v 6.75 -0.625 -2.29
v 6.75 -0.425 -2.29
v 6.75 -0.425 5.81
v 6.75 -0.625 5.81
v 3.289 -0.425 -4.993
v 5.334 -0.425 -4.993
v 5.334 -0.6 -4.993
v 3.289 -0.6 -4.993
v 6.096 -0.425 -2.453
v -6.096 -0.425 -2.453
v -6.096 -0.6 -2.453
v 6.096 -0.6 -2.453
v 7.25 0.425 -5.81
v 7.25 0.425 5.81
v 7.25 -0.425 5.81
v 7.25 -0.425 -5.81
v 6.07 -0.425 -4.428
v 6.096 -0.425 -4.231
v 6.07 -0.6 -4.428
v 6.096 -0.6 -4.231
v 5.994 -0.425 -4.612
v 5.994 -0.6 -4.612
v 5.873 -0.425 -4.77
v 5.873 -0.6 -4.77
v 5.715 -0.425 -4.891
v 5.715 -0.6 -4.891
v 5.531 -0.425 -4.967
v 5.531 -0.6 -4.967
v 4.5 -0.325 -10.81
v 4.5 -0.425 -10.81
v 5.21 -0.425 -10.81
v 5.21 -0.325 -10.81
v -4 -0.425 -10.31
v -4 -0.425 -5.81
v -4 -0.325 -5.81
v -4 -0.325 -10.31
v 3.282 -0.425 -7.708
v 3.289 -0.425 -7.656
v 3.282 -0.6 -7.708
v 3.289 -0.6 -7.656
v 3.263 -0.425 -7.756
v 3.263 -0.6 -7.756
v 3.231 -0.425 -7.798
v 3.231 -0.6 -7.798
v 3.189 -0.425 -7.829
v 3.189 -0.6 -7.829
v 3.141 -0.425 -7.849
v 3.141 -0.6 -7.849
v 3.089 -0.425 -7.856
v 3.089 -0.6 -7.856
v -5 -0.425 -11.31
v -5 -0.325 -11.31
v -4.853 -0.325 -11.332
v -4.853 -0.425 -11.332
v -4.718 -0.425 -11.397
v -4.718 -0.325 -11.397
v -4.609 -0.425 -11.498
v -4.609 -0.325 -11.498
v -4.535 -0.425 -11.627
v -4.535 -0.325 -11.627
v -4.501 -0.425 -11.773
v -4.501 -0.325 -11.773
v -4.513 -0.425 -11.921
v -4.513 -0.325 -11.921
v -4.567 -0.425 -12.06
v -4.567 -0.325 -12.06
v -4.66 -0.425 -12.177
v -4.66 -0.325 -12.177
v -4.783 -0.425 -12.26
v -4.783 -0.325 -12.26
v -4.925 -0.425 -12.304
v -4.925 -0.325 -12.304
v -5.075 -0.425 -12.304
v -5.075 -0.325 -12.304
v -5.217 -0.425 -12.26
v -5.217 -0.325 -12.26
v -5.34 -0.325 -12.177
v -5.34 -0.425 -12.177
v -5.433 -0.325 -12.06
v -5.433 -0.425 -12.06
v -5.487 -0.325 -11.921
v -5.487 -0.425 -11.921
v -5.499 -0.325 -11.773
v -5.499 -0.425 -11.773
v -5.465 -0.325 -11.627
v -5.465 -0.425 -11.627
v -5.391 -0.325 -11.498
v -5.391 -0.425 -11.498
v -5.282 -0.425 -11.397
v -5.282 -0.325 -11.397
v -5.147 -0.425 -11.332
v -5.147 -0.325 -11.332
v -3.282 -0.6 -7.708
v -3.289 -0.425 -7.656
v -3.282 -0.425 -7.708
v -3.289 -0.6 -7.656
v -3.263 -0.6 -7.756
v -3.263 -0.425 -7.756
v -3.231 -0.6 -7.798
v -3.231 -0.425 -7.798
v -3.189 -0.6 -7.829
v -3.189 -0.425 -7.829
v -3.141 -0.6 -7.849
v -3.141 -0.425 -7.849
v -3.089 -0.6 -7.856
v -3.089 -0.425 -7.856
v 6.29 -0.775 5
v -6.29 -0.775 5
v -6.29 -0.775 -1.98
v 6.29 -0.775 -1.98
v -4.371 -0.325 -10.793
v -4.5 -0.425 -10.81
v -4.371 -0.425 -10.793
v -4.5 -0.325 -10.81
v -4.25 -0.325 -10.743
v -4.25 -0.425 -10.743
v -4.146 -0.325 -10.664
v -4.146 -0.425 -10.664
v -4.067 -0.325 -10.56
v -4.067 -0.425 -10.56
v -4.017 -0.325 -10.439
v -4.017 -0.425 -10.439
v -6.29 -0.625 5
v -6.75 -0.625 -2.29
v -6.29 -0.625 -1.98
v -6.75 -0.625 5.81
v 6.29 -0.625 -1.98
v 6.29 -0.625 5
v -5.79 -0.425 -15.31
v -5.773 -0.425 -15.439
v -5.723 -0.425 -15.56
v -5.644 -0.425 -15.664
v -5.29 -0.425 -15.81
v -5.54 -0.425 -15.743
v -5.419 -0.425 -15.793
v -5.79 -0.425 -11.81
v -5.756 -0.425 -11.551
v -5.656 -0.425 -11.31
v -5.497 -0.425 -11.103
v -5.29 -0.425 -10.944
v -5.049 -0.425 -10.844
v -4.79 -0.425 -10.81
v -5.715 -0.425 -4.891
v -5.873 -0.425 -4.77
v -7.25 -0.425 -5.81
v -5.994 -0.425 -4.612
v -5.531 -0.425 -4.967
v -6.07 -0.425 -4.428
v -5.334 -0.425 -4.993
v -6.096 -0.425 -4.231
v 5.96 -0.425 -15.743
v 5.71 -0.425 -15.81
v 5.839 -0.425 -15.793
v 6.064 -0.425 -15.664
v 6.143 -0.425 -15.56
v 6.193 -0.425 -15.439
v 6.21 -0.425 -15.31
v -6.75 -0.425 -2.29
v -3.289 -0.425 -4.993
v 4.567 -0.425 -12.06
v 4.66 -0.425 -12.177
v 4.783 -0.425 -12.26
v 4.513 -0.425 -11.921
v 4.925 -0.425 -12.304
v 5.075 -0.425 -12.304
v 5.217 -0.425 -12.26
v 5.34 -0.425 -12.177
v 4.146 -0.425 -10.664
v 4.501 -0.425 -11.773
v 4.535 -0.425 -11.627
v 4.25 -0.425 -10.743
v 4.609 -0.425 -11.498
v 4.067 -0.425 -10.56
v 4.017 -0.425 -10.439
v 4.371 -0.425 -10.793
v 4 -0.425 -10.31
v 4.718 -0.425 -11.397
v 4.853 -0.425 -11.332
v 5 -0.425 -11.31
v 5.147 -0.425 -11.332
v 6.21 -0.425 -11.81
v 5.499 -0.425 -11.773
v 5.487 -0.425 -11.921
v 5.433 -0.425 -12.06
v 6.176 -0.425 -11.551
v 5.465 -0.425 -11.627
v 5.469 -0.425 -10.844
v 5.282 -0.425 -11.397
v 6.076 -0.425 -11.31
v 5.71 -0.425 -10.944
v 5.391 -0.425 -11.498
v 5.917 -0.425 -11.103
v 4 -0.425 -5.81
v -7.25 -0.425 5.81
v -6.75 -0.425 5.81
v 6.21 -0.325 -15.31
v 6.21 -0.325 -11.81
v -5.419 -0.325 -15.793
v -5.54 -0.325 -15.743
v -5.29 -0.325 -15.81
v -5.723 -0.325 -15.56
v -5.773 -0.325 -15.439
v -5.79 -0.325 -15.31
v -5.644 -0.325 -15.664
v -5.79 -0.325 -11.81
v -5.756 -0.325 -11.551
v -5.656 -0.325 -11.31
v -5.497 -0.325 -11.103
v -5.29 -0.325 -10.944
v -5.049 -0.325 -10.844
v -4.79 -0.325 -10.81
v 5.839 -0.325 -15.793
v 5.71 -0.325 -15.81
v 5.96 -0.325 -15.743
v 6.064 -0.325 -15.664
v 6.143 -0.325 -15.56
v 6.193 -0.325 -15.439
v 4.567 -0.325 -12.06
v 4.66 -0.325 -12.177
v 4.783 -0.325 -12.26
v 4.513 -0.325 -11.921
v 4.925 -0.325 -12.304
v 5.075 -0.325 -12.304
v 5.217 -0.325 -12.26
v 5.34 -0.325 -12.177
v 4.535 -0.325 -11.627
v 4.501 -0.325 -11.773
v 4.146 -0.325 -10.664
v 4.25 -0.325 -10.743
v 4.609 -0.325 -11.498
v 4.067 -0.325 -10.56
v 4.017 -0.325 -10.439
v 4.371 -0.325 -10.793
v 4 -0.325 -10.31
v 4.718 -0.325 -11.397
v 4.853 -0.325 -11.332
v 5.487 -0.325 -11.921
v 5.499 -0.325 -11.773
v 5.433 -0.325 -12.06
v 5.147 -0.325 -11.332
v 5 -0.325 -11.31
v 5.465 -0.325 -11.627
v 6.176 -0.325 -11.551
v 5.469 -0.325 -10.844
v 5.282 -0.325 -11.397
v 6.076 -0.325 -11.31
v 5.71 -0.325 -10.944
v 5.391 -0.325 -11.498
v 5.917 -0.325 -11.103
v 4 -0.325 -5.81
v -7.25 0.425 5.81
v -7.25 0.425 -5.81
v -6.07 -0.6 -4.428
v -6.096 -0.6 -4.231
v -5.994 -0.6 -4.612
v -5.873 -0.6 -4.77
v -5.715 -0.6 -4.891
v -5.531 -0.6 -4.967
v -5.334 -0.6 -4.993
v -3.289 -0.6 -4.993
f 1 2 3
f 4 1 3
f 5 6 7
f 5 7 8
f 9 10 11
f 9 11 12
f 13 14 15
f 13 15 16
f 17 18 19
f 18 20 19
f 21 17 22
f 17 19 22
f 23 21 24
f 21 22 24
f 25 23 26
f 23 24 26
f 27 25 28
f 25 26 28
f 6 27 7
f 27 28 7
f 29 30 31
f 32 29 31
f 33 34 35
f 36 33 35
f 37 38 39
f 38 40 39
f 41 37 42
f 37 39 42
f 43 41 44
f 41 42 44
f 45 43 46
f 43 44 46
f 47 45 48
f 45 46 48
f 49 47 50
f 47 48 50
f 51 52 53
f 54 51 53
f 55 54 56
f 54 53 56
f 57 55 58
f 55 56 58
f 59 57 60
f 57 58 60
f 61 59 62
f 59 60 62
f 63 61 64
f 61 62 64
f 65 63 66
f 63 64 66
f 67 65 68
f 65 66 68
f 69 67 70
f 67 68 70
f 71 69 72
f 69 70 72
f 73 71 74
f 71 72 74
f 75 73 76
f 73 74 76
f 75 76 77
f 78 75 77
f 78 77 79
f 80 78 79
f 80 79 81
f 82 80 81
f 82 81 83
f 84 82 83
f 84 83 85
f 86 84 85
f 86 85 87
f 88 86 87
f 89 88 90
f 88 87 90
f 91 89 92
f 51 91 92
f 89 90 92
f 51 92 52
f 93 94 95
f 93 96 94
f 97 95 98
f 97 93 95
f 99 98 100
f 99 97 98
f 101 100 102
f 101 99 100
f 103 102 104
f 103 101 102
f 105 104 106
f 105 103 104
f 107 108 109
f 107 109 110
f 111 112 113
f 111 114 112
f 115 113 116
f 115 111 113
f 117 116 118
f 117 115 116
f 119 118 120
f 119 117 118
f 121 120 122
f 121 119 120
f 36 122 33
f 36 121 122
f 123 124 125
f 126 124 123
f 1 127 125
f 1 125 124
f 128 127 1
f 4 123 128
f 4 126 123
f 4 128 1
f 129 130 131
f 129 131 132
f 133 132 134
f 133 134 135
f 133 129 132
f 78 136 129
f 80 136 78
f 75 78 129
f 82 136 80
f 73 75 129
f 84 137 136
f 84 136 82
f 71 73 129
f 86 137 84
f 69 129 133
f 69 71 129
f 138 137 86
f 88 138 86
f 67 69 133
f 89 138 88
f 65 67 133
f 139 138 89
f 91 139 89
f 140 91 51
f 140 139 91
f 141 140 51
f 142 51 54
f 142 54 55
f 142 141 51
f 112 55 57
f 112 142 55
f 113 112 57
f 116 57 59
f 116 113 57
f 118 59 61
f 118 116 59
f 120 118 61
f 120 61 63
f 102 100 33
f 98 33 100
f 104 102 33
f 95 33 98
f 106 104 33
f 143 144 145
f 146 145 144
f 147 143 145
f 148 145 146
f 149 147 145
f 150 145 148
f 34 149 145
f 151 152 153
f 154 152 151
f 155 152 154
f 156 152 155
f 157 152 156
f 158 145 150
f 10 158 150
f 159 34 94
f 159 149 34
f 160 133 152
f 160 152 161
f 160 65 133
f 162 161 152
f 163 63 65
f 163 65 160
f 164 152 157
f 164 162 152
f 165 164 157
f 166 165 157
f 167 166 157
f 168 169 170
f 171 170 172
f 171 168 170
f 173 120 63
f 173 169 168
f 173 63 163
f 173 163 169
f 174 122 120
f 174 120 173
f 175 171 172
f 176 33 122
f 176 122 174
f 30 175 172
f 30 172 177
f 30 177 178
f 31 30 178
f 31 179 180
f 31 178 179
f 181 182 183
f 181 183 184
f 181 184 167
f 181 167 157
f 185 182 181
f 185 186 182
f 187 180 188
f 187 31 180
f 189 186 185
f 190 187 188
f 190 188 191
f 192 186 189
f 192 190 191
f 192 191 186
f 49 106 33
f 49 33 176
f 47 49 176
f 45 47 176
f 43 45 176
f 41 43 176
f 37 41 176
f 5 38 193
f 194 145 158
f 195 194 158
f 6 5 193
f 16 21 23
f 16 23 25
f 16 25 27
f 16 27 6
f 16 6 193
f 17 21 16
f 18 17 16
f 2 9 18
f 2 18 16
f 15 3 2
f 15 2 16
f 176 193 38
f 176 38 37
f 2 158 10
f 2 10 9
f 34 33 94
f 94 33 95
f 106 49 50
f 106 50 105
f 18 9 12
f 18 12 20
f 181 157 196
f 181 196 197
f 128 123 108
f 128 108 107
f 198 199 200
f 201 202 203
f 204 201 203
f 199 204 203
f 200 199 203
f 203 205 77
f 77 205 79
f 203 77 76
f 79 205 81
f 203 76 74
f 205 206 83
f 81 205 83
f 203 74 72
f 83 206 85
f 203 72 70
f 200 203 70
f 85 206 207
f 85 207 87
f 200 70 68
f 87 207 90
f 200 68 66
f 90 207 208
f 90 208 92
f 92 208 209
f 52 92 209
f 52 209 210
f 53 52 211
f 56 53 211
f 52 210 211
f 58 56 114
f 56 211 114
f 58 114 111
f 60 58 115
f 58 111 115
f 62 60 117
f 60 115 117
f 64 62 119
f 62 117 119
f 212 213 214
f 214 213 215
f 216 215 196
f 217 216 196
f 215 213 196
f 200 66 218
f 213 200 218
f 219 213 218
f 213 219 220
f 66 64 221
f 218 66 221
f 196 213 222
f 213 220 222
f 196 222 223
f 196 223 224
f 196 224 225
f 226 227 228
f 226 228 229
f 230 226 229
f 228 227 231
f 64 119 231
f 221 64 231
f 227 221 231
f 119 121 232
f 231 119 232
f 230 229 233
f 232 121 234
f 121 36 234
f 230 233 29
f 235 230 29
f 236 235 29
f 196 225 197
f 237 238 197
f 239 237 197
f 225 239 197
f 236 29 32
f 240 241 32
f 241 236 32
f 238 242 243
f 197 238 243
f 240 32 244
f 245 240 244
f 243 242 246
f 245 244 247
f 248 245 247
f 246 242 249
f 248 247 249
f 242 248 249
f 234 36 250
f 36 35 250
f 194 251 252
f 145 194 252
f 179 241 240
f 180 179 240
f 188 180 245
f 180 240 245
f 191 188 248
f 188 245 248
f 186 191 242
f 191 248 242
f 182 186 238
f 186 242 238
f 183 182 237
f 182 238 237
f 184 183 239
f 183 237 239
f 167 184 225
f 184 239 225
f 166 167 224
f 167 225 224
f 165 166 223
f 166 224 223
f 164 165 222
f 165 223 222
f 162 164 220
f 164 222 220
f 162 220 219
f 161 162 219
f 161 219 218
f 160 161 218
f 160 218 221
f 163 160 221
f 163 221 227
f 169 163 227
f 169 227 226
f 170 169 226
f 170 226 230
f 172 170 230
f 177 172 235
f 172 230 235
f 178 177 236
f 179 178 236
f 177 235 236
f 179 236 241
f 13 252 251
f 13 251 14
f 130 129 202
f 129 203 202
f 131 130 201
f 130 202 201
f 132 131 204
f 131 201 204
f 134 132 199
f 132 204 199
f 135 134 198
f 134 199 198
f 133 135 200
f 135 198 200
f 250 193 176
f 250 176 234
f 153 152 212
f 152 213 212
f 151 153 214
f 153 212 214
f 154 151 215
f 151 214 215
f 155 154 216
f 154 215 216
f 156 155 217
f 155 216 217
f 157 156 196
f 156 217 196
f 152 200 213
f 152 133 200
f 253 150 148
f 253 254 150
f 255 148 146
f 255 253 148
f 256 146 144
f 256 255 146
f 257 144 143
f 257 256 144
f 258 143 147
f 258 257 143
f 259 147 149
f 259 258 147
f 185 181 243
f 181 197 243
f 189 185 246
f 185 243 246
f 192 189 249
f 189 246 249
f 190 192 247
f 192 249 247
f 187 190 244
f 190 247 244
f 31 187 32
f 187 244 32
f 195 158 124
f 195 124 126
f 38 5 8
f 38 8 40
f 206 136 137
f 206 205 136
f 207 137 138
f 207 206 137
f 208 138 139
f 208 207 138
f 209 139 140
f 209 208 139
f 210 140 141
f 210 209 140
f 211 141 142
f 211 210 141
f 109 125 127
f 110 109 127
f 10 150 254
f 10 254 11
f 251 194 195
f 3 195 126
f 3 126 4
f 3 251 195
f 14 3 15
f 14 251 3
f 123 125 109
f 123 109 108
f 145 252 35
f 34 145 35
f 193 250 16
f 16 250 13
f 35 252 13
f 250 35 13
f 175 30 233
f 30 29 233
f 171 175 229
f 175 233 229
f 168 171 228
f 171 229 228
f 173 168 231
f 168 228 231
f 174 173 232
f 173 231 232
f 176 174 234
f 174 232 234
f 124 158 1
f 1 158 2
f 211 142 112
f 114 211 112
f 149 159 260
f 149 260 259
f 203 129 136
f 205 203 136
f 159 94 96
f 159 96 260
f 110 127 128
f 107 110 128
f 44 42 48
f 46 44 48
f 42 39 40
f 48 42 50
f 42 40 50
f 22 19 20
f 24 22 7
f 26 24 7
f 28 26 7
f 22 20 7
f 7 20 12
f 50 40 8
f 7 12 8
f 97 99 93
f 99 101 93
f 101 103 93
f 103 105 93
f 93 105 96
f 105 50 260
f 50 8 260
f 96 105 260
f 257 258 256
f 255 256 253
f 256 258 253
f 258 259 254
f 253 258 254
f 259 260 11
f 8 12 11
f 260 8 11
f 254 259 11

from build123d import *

# Parameters (mm, degrees)
SKETCH2_W           = 14.5
SKETCH2_H           = 11.62
BOSS_EXTRUDE1_DEPTH = 0.425
SKETCH6_W           = 13.5
SKETCH6_H           = 8.1
BOSS_EXTRUDE2_DEPTH = 0.2
SKETCH7_W           = 12.58
SKETCH7_H           = 6.98
BOSS_EXTRUDE3_DEPTH = 0.15
BOSS_EXTRUDE4_DEPTH = 0.17547
FILLET1_R           = 0.762
FILLET2_R           = 0.2
SKETCH13_W          = 8
SKETCH13_H          = 0.1
BOSS_EXTRUDE5_DEPTH = 10
SKETCH20_W          = 1.79
SKETCH20_H          = 5
SKETCH20_W_2        = 2.21
BOSS_EXTRUDE6_DEPTH = 0.1
SKETCH23_R          = 0.5
CUT_EXTRUDE1_DEPTH  = 0.1
FILLET3_R           = 1
FILLET4_R           = 0.5
FILLET5_R           = 0.5


with BuildPart() as part:
    # Sketch2 → Boss-Extrude1 (new, symmetric)
    with BuildSketch(Plane(origin=(0, 0, 0), x_dir=(1, 0, 0), z_dir=(0, 1, 0))):
        Rectangle(SKETCH2_W, SKETCH2_H)
    extrude(amount=BOSS_EXTRUDE1_DEPTH, both=True)

    # Sketch6 → Boss-Extrude2 (add)
    with BuildSketch(Plane.XZ.offset(0.425)):
        with Locations((0, 1.76)):
            Rectangle(SKETCH6_W, SKETCH6_H)
    extrude(amount=BOSS_EXTRUDE2_DEPTH)

    # Sketch7 → Boss-Extrude3 (add)
    with BuildSketch(Plane.XZ.offset(0.625)):
        with Locations((0, 1.51)):
            Rectangle(SKETCH7_W, SKETCH7_H)
    extrude(amount=BOSS_EXTRUDE3_DEPTH)

    # Sketch9 → Boss-Extrude4 (add)
    with BuildSketch(Plane.XZ.offset(0.425)):
        Polygon((-6.096, -2.452696), (6.096, -2.452696), (6.096, -4.992696), (3.2893, -4.992696), (3.2893, -7.856286), (-3.2893, -7.856286), (-3.2893, -4.992696), (-6.096, -4.992696), align=None)
    extrude(amount=BOSS_EXTRUDE4_DEPTH)

    # Fillet1
    fillet1_edges = [part.edges().sort_by_distance(p)[0] for p in [
        (6.096, -0.512735, -4.992696),
        (-6.096, -0.512735, -4.992696),
    ]]
    fillet(fillet1_edges, radius=FILLET1_R)

    # Fillet2
    fillet2_edges = [part.edges().sort_by_distance(p)[0] for p in [
        (-3.2893, -0.512735, -7.856286),
        (3.2893, -0.512735, -7.856286),
    ]]
    fillet(fillet2_edges, radius=FILLET2_R)

    # Sketch13 → Boss-Extrude5 (add)
    with BuildSketch(Plane(origin=(0, 0, -5.81), x_dir=(-1, 0, 0), z_dir=(0, 0, -1))):
        with Locations((0, -0.375)):
            Rectangle(SKETCH13_W, SKETCH13_H)
    extrude(amount=BOSS_EXTRUDE5_DEPTH)

    # Sketch20 → Boss-Extrude6 (add)
    with BuildSketch(Plane.XZ.offset(0.425)):
        with Locations((-4.895, -13.31)):
            Rectangle(SKETCH20_W, SKETCH20_H)
        with Locations((5.105, -13.31)):
            Rectangle(SKETCH20_W_2, SKETCH20_H)
    extrude(amount=-BOSS_EXTRUDE6_DEPTH)

    # Sketch23 → Cut-Extrude1 (cut)
    with BuildSketch(Plane(origin=(0, -0.325, 0), x_dir=(1, 0, 0), z_dir=(0, 1, 0))):
        with Locations(Location((5, 11.81, 0), (0, 0, 270))):
            Circle(SKETCH23_R)
        with Locations(Location((-5, 11.81, 0), (0, 0, 270))):
            Circle(SKETCH23_R)
    extrude(amount=-CUT_EXTRUDE1_DEPTH, mode=Mode.SUBTRACT)

    # Fillet3
    fillet3_edges = [part.edges().sort_by_distance(p)[0] for p in [
        (-5.79, -0.375, -10.81),
        (6.21, -0.375, -10.81),
    ]]
    fillet(fillet3_edges, radius=FILLET3_R)

    # Fillet4
    fillet4_edges = [part.edges().sort_by_distance(p)[0] for p in [
        (-5.79, -0.375, -15.81),
        (6.21, -0.375, -15.81),
    ]]
    fillet(fillet4_edges, radius=FILLET4_R)

    # Fillet5
    fillet5_edges = [part.edges().sort_by_distance(p)[0] for p in [
        (-4, -0.375, -10.81),
        (4, -0.375, -10.81),
    ]]
    fillet(fillet5_edges, radius=FILLET5_R)


solid = part.part
